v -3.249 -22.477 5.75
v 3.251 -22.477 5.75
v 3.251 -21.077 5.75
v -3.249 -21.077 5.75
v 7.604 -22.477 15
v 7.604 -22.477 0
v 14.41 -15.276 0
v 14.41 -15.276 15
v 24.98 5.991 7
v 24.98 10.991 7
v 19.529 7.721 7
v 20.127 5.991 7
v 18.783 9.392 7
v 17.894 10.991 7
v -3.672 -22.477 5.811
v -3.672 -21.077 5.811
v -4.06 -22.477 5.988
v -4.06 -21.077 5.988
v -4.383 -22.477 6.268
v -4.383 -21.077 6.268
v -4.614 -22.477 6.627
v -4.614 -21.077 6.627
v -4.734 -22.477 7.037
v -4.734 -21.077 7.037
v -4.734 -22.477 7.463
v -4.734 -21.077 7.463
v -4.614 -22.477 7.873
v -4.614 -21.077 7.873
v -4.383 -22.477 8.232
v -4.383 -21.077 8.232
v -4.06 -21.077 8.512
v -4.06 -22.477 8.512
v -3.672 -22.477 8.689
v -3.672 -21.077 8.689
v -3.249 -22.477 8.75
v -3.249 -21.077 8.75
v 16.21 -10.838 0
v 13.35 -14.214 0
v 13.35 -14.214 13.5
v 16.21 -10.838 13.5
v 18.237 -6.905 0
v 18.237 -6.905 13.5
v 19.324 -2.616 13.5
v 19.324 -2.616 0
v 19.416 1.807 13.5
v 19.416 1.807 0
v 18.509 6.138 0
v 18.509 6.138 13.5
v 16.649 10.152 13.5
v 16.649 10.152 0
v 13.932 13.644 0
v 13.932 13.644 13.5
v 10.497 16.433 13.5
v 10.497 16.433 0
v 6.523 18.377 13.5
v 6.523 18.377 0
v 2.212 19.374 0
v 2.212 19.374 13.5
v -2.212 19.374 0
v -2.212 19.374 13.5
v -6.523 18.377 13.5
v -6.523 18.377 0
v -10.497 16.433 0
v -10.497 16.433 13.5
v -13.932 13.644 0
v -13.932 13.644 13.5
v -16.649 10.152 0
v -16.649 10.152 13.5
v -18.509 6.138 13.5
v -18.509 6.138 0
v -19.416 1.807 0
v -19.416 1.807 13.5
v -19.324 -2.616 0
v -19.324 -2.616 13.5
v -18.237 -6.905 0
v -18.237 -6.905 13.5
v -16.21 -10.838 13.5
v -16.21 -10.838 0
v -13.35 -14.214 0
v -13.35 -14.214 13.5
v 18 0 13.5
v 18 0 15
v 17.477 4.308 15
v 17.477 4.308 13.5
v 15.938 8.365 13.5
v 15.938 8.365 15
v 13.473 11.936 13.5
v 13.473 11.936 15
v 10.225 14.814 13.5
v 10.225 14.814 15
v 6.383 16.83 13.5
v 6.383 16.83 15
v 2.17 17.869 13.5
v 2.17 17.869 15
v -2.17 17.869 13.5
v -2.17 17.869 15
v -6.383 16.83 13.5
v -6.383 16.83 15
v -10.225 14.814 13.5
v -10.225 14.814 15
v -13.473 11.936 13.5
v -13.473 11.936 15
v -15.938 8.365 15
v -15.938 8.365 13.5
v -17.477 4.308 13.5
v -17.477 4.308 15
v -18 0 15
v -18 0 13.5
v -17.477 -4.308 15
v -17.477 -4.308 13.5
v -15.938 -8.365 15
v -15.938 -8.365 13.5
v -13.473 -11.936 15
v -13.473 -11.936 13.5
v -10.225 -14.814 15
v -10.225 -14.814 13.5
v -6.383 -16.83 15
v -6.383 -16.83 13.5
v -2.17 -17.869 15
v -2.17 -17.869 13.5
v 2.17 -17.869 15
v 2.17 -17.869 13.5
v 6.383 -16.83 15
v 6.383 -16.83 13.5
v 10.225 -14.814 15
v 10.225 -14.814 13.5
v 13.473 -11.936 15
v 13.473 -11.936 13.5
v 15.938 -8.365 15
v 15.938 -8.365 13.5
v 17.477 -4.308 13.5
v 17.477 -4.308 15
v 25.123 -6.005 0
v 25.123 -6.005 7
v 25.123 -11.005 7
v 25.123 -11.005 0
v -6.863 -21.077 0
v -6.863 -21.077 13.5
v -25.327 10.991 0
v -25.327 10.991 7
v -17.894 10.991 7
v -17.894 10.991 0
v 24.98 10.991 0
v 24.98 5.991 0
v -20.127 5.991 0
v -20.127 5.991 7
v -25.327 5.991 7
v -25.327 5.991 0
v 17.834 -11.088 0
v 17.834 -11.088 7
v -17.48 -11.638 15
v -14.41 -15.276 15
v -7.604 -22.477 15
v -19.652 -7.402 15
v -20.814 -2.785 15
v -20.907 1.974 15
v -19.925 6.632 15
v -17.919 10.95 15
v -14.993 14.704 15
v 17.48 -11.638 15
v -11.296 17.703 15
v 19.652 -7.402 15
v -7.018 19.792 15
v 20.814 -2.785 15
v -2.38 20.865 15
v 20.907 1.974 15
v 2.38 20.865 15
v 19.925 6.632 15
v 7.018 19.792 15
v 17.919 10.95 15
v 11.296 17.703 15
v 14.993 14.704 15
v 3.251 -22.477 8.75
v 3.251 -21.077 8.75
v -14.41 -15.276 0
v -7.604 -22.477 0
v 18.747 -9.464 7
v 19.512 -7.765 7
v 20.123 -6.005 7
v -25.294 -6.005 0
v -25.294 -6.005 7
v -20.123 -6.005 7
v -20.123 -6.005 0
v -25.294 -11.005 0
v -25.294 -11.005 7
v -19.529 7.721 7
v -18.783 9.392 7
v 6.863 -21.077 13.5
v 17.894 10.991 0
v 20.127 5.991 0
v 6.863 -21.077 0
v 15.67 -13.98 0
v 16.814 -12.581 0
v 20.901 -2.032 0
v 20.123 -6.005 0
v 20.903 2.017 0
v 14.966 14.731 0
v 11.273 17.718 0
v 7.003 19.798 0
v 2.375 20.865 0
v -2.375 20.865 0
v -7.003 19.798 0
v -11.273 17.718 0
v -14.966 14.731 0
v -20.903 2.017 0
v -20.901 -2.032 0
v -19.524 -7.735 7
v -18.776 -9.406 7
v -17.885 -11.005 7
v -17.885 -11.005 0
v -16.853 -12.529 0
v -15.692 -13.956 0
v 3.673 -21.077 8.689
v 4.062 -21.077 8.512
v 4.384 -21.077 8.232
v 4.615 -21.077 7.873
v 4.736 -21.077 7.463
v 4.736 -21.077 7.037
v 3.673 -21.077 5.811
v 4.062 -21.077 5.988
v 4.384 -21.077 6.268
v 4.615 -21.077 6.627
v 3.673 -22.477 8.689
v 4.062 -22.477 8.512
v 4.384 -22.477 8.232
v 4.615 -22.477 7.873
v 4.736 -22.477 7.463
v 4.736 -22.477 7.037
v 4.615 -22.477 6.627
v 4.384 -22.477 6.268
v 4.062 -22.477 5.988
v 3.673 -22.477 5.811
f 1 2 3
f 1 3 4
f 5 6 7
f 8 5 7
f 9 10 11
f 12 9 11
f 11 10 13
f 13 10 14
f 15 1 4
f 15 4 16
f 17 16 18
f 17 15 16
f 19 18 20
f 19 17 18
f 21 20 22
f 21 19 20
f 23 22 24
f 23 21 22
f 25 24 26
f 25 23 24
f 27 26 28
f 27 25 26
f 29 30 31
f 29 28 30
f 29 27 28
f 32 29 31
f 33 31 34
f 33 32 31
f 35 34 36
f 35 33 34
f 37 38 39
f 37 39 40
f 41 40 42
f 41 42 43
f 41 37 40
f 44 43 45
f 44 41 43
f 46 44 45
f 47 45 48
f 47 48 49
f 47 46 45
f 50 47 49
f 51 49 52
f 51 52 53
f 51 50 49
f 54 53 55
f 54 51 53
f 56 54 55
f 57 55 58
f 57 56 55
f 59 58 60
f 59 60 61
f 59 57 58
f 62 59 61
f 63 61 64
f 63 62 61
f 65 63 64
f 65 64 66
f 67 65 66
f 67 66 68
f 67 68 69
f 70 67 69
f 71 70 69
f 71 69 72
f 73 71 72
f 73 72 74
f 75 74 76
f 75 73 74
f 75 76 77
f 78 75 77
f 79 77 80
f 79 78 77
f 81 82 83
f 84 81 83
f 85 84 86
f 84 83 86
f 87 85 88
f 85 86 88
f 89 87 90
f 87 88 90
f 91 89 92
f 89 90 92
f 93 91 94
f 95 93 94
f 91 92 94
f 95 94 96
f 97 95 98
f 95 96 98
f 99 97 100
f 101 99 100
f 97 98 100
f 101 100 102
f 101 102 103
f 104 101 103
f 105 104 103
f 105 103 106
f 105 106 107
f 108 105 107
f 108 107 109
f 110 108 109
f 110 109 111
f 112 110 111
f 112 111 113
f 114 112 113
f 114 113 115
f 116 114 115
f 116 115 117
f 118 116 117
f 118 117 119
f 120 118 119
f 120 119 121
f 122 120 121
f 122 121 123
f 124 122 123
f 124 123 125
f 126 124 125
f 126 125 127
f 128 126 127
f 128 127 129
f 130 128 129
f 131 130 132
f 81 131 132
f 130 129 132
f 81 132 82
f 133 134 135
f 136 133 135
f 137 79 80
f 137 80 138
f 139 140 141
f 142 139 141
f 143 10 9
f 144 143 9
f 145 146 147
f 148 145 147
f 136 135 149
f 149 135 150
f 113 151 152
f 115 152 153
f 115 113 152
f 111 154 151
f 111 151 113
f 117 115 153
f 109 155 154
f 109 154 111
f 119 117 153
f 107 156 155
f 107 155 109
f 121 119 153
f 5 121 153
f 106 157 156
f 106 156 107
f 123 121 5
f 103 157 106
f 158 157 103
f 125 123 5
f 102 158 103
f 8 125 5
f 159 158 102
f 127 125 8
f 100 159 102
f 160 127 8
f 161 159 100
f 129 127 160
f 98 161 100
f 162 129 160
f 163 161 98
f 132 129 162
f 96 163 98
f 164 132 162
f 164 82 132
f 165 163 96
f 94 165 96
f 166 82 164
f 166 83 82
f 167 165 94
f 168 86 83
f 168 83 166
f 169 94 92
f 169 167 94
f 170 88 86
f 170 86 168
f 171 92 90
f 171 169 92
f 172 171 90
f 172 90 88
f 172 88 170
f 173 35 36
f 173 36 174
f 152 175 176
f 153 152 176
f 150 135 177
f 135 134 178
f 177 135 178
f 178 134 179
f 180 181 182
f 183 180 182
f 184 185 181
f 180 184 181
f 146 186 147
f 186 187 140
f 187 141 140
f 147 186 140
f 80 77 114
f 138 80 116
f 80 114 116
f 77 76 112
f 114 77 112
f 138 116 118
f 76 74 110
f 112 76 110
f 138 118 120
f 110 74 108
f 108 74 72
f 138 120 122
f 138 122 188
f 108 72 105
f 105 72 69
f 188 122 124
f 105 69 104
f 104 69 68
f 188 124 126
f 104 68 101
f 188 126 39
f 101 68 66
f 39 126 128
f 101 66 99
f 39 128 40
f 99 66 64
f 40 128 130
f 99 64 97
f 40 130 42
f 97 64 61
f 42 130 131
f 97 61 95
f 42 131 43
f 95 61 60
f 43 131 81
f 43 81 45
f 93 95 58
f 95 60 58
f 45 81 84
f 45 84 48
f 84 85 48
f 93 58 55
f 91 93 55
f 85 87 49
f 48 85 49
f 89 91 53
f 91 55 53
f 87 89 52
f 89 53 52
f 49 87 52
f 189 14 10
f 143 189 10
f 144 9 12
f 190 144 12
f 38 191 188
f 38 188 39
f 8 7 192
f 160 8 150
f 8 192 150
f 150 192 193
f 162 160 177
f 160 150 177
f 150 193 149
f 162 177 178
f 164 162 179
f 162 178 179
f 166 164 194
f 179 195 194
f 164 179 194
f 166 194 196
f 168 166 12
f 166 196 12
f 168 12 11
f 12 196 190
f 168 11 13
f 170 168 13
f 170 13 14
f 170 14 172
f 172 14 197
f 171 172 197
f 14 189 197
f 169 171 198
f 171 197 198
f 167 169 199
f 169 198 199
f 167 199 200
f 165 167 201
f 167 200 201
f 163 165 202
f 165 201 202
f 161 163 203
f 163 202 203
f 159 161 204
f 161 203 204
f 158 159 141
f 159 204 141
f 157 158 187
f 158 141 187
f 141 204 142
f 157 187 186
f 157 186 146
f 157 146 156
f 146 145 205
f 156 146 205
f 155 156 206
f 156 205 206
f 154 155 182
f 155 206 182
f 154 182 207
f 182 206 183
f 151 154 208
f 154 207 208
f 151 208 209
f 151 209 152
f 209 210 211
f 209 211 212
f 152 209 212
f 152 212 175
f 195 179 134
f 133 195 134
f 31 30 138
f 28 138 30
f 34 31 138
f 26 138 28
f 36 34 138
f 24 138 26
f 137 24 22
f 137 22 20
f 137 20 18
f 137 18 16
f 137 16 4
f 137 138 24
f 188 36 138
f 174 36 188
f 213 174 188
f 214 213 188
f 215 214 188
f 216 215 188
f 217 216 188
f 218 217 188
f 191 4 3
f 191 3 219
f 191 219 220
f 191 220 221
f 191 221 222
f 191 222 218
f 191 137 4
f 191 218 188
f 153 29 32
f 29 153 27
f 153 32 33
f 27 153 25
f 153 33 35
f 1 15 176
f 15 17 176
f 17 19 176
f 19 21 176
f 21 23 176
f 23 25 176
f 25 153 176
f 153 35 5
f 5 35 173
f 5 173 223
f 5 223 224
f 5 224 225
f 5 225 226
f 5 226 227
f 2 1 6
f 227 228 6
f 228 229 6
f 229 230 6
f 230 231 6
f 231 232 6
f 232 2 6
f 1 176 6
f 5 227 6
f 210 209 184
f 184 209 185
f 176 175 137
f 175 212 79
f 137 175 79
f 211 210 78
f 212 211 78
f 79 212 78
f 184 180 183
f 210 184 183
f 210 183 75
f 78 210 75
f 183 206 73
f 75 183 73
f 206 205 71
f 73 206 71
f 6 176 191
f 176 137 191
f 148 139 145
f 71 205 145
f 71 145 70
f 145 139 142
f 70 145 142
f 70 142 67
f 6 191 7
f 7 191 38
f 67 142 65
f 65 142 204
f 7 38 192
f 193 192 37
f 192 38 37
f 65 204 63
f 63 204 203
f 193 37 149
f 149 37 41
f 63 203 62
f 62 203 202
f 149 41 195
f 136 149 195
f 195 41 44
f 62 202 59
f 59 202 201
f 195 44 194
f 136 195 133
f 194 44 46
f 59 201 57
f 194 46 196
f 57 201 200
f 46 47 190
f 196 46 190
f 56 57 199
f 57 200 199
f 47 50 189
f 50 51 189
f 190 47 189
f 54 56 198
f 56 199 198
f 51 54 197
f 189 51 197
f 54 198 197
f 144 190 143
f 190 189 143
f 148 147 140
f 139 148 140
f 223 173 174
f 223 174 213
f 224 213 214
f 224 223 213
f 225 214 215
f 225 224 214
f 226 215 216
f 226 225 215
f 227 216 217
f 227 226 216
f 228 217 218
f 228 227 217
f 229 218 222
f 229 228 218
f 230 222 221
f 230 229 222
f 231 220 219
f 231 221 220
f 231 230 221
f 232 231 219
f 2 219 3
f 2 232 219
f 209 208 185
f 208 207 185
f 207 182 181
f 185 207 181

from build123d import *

# Parameters (mm, degrees)
BOSS_EXTRUDE1_DEPTH = 15
SHELL3_DEPTH        = 13.5
SKETCH5_R           = 18
CUT_EXTRUDE4_DEPTH  = 11
BOSS_EXTRUDE2_START = -8
BOSS_EXTRUDE2_DEPTH = 7
CUT_EXTRUDE5_REACH  = 54.505


# Read off the part's stored shape, not the designer's step: Shell3
with BuildPart() as part:
    # Sketch1 → Boss-Extrude1 (new body)
    with BuildSketch(Plane.XY):
        with BuildLine():
            Line((-7.603827524, -22.477243695), (7.603827524, -22.477243695))
            Line((7.603827524, -22.477243695), (14.409989224, -15.275870207))
            ThreePointArc((14.409989224, -15.275870207), (0, 21), (-14.409989224, -15.275870207))
            Line((-14.409989224, -15.275870207), (-7.603827524, -22.477243695))
        make_face()
    extrude(amount=BOSS_EXTRUDE1_DEPTH)

    # Shell3 outline → Shell3 (cut)
    with BuildSketch(Plane.XY):
        with BuildLine():
            Line((6.863063192, -21.077243695), (13.349946464, -14.213688101))
            ThreePointArc((13.349946464, -14.213688101), (0, 19.5), (-13.349946464, -14.213688101))
            Line((-13.349946464, -14.213688101), (-6.863063192, -21.077243695))
            Line((-6.863063192, -21.077243695), (6.863063192, -21.077243695))
        make_face()
    extrude(amount=SHELL3_DEPTH, mode=Mode.SUBTRACT)

    # Sketch5 → Cut-Extrude4 (cut)
    with BuildSketch(Plane.XY.offset(15)):
        Circle(SKETCH5_R)
    extrude(amount=-CUT_EXTRUDE4_DEPTH, mode=Mode.SUBTRACT)

    # Sketch6 → Boss-Extrude2 (add)
    with BuildSketch(Plane.XY.offset(15).offset(BOSS_EXTRUDE2_START)):
        Polygon((17.530464007, 10.991223826), (24.980464007, 10.991223826), (24.980464007, 5.991223826), (19.980464007, 5.991223826), align=None)
        Polygon((17.673562003, -11.090259794), (20.075985217, -6.005149393), (25.123075828, -6.005149393), (25.123075828, -11.005149393), align=None)
        Polygon((-17.877308509, 10.991223826), (-20.094018297, 5.991223826), (-25.327308509, 5.991223826), (-25.327308509, 10.991223826), align=None)
        Polygon((-25.294081514, -11.005149393), (-25.294081514, -6.005149393), (-20.094018297, -6.005149393), (-17.844081514, -11.005149393), align=None)
    extrude(amount=-BOSS_EXTRUDE2_DEPTH)

    # Sketch21 → Cut-Extrude5 (cut, up to next)
    with BuildSketch(Plane.XZ.offset(22.477243695), mode=Mode.PRIVATE) as cut_extrude5_sk1:
        with BuildLine():
            Line((-3.249172698, 8.75), (3.250827302, 8.75))
            ThreePointArc((3.250827302, 8.75), (4.750827302, 7.25), (3.250827302, 5.75))
            Line((3.250827302, 5.75), (-3.249172698, 5.75))
            ThreePointArc((-3.249172698, 5.75), (-4.749172698, 7.25), (-3.249172698, 8.75))
        make_face()
    cut_extrude5_tool1 = extrude(cut_extrude5_sk1.sketch, amount=-CUT_EXTRUDE5_REACH, mode=Mode.PRIVATE) & part.part
    add(cut_extrude5_tool1.solids().sort_by_distance((0.000827, -22.477244, 7.25))[0], mode=Mode.SUBTRACT)


solid = part.part
